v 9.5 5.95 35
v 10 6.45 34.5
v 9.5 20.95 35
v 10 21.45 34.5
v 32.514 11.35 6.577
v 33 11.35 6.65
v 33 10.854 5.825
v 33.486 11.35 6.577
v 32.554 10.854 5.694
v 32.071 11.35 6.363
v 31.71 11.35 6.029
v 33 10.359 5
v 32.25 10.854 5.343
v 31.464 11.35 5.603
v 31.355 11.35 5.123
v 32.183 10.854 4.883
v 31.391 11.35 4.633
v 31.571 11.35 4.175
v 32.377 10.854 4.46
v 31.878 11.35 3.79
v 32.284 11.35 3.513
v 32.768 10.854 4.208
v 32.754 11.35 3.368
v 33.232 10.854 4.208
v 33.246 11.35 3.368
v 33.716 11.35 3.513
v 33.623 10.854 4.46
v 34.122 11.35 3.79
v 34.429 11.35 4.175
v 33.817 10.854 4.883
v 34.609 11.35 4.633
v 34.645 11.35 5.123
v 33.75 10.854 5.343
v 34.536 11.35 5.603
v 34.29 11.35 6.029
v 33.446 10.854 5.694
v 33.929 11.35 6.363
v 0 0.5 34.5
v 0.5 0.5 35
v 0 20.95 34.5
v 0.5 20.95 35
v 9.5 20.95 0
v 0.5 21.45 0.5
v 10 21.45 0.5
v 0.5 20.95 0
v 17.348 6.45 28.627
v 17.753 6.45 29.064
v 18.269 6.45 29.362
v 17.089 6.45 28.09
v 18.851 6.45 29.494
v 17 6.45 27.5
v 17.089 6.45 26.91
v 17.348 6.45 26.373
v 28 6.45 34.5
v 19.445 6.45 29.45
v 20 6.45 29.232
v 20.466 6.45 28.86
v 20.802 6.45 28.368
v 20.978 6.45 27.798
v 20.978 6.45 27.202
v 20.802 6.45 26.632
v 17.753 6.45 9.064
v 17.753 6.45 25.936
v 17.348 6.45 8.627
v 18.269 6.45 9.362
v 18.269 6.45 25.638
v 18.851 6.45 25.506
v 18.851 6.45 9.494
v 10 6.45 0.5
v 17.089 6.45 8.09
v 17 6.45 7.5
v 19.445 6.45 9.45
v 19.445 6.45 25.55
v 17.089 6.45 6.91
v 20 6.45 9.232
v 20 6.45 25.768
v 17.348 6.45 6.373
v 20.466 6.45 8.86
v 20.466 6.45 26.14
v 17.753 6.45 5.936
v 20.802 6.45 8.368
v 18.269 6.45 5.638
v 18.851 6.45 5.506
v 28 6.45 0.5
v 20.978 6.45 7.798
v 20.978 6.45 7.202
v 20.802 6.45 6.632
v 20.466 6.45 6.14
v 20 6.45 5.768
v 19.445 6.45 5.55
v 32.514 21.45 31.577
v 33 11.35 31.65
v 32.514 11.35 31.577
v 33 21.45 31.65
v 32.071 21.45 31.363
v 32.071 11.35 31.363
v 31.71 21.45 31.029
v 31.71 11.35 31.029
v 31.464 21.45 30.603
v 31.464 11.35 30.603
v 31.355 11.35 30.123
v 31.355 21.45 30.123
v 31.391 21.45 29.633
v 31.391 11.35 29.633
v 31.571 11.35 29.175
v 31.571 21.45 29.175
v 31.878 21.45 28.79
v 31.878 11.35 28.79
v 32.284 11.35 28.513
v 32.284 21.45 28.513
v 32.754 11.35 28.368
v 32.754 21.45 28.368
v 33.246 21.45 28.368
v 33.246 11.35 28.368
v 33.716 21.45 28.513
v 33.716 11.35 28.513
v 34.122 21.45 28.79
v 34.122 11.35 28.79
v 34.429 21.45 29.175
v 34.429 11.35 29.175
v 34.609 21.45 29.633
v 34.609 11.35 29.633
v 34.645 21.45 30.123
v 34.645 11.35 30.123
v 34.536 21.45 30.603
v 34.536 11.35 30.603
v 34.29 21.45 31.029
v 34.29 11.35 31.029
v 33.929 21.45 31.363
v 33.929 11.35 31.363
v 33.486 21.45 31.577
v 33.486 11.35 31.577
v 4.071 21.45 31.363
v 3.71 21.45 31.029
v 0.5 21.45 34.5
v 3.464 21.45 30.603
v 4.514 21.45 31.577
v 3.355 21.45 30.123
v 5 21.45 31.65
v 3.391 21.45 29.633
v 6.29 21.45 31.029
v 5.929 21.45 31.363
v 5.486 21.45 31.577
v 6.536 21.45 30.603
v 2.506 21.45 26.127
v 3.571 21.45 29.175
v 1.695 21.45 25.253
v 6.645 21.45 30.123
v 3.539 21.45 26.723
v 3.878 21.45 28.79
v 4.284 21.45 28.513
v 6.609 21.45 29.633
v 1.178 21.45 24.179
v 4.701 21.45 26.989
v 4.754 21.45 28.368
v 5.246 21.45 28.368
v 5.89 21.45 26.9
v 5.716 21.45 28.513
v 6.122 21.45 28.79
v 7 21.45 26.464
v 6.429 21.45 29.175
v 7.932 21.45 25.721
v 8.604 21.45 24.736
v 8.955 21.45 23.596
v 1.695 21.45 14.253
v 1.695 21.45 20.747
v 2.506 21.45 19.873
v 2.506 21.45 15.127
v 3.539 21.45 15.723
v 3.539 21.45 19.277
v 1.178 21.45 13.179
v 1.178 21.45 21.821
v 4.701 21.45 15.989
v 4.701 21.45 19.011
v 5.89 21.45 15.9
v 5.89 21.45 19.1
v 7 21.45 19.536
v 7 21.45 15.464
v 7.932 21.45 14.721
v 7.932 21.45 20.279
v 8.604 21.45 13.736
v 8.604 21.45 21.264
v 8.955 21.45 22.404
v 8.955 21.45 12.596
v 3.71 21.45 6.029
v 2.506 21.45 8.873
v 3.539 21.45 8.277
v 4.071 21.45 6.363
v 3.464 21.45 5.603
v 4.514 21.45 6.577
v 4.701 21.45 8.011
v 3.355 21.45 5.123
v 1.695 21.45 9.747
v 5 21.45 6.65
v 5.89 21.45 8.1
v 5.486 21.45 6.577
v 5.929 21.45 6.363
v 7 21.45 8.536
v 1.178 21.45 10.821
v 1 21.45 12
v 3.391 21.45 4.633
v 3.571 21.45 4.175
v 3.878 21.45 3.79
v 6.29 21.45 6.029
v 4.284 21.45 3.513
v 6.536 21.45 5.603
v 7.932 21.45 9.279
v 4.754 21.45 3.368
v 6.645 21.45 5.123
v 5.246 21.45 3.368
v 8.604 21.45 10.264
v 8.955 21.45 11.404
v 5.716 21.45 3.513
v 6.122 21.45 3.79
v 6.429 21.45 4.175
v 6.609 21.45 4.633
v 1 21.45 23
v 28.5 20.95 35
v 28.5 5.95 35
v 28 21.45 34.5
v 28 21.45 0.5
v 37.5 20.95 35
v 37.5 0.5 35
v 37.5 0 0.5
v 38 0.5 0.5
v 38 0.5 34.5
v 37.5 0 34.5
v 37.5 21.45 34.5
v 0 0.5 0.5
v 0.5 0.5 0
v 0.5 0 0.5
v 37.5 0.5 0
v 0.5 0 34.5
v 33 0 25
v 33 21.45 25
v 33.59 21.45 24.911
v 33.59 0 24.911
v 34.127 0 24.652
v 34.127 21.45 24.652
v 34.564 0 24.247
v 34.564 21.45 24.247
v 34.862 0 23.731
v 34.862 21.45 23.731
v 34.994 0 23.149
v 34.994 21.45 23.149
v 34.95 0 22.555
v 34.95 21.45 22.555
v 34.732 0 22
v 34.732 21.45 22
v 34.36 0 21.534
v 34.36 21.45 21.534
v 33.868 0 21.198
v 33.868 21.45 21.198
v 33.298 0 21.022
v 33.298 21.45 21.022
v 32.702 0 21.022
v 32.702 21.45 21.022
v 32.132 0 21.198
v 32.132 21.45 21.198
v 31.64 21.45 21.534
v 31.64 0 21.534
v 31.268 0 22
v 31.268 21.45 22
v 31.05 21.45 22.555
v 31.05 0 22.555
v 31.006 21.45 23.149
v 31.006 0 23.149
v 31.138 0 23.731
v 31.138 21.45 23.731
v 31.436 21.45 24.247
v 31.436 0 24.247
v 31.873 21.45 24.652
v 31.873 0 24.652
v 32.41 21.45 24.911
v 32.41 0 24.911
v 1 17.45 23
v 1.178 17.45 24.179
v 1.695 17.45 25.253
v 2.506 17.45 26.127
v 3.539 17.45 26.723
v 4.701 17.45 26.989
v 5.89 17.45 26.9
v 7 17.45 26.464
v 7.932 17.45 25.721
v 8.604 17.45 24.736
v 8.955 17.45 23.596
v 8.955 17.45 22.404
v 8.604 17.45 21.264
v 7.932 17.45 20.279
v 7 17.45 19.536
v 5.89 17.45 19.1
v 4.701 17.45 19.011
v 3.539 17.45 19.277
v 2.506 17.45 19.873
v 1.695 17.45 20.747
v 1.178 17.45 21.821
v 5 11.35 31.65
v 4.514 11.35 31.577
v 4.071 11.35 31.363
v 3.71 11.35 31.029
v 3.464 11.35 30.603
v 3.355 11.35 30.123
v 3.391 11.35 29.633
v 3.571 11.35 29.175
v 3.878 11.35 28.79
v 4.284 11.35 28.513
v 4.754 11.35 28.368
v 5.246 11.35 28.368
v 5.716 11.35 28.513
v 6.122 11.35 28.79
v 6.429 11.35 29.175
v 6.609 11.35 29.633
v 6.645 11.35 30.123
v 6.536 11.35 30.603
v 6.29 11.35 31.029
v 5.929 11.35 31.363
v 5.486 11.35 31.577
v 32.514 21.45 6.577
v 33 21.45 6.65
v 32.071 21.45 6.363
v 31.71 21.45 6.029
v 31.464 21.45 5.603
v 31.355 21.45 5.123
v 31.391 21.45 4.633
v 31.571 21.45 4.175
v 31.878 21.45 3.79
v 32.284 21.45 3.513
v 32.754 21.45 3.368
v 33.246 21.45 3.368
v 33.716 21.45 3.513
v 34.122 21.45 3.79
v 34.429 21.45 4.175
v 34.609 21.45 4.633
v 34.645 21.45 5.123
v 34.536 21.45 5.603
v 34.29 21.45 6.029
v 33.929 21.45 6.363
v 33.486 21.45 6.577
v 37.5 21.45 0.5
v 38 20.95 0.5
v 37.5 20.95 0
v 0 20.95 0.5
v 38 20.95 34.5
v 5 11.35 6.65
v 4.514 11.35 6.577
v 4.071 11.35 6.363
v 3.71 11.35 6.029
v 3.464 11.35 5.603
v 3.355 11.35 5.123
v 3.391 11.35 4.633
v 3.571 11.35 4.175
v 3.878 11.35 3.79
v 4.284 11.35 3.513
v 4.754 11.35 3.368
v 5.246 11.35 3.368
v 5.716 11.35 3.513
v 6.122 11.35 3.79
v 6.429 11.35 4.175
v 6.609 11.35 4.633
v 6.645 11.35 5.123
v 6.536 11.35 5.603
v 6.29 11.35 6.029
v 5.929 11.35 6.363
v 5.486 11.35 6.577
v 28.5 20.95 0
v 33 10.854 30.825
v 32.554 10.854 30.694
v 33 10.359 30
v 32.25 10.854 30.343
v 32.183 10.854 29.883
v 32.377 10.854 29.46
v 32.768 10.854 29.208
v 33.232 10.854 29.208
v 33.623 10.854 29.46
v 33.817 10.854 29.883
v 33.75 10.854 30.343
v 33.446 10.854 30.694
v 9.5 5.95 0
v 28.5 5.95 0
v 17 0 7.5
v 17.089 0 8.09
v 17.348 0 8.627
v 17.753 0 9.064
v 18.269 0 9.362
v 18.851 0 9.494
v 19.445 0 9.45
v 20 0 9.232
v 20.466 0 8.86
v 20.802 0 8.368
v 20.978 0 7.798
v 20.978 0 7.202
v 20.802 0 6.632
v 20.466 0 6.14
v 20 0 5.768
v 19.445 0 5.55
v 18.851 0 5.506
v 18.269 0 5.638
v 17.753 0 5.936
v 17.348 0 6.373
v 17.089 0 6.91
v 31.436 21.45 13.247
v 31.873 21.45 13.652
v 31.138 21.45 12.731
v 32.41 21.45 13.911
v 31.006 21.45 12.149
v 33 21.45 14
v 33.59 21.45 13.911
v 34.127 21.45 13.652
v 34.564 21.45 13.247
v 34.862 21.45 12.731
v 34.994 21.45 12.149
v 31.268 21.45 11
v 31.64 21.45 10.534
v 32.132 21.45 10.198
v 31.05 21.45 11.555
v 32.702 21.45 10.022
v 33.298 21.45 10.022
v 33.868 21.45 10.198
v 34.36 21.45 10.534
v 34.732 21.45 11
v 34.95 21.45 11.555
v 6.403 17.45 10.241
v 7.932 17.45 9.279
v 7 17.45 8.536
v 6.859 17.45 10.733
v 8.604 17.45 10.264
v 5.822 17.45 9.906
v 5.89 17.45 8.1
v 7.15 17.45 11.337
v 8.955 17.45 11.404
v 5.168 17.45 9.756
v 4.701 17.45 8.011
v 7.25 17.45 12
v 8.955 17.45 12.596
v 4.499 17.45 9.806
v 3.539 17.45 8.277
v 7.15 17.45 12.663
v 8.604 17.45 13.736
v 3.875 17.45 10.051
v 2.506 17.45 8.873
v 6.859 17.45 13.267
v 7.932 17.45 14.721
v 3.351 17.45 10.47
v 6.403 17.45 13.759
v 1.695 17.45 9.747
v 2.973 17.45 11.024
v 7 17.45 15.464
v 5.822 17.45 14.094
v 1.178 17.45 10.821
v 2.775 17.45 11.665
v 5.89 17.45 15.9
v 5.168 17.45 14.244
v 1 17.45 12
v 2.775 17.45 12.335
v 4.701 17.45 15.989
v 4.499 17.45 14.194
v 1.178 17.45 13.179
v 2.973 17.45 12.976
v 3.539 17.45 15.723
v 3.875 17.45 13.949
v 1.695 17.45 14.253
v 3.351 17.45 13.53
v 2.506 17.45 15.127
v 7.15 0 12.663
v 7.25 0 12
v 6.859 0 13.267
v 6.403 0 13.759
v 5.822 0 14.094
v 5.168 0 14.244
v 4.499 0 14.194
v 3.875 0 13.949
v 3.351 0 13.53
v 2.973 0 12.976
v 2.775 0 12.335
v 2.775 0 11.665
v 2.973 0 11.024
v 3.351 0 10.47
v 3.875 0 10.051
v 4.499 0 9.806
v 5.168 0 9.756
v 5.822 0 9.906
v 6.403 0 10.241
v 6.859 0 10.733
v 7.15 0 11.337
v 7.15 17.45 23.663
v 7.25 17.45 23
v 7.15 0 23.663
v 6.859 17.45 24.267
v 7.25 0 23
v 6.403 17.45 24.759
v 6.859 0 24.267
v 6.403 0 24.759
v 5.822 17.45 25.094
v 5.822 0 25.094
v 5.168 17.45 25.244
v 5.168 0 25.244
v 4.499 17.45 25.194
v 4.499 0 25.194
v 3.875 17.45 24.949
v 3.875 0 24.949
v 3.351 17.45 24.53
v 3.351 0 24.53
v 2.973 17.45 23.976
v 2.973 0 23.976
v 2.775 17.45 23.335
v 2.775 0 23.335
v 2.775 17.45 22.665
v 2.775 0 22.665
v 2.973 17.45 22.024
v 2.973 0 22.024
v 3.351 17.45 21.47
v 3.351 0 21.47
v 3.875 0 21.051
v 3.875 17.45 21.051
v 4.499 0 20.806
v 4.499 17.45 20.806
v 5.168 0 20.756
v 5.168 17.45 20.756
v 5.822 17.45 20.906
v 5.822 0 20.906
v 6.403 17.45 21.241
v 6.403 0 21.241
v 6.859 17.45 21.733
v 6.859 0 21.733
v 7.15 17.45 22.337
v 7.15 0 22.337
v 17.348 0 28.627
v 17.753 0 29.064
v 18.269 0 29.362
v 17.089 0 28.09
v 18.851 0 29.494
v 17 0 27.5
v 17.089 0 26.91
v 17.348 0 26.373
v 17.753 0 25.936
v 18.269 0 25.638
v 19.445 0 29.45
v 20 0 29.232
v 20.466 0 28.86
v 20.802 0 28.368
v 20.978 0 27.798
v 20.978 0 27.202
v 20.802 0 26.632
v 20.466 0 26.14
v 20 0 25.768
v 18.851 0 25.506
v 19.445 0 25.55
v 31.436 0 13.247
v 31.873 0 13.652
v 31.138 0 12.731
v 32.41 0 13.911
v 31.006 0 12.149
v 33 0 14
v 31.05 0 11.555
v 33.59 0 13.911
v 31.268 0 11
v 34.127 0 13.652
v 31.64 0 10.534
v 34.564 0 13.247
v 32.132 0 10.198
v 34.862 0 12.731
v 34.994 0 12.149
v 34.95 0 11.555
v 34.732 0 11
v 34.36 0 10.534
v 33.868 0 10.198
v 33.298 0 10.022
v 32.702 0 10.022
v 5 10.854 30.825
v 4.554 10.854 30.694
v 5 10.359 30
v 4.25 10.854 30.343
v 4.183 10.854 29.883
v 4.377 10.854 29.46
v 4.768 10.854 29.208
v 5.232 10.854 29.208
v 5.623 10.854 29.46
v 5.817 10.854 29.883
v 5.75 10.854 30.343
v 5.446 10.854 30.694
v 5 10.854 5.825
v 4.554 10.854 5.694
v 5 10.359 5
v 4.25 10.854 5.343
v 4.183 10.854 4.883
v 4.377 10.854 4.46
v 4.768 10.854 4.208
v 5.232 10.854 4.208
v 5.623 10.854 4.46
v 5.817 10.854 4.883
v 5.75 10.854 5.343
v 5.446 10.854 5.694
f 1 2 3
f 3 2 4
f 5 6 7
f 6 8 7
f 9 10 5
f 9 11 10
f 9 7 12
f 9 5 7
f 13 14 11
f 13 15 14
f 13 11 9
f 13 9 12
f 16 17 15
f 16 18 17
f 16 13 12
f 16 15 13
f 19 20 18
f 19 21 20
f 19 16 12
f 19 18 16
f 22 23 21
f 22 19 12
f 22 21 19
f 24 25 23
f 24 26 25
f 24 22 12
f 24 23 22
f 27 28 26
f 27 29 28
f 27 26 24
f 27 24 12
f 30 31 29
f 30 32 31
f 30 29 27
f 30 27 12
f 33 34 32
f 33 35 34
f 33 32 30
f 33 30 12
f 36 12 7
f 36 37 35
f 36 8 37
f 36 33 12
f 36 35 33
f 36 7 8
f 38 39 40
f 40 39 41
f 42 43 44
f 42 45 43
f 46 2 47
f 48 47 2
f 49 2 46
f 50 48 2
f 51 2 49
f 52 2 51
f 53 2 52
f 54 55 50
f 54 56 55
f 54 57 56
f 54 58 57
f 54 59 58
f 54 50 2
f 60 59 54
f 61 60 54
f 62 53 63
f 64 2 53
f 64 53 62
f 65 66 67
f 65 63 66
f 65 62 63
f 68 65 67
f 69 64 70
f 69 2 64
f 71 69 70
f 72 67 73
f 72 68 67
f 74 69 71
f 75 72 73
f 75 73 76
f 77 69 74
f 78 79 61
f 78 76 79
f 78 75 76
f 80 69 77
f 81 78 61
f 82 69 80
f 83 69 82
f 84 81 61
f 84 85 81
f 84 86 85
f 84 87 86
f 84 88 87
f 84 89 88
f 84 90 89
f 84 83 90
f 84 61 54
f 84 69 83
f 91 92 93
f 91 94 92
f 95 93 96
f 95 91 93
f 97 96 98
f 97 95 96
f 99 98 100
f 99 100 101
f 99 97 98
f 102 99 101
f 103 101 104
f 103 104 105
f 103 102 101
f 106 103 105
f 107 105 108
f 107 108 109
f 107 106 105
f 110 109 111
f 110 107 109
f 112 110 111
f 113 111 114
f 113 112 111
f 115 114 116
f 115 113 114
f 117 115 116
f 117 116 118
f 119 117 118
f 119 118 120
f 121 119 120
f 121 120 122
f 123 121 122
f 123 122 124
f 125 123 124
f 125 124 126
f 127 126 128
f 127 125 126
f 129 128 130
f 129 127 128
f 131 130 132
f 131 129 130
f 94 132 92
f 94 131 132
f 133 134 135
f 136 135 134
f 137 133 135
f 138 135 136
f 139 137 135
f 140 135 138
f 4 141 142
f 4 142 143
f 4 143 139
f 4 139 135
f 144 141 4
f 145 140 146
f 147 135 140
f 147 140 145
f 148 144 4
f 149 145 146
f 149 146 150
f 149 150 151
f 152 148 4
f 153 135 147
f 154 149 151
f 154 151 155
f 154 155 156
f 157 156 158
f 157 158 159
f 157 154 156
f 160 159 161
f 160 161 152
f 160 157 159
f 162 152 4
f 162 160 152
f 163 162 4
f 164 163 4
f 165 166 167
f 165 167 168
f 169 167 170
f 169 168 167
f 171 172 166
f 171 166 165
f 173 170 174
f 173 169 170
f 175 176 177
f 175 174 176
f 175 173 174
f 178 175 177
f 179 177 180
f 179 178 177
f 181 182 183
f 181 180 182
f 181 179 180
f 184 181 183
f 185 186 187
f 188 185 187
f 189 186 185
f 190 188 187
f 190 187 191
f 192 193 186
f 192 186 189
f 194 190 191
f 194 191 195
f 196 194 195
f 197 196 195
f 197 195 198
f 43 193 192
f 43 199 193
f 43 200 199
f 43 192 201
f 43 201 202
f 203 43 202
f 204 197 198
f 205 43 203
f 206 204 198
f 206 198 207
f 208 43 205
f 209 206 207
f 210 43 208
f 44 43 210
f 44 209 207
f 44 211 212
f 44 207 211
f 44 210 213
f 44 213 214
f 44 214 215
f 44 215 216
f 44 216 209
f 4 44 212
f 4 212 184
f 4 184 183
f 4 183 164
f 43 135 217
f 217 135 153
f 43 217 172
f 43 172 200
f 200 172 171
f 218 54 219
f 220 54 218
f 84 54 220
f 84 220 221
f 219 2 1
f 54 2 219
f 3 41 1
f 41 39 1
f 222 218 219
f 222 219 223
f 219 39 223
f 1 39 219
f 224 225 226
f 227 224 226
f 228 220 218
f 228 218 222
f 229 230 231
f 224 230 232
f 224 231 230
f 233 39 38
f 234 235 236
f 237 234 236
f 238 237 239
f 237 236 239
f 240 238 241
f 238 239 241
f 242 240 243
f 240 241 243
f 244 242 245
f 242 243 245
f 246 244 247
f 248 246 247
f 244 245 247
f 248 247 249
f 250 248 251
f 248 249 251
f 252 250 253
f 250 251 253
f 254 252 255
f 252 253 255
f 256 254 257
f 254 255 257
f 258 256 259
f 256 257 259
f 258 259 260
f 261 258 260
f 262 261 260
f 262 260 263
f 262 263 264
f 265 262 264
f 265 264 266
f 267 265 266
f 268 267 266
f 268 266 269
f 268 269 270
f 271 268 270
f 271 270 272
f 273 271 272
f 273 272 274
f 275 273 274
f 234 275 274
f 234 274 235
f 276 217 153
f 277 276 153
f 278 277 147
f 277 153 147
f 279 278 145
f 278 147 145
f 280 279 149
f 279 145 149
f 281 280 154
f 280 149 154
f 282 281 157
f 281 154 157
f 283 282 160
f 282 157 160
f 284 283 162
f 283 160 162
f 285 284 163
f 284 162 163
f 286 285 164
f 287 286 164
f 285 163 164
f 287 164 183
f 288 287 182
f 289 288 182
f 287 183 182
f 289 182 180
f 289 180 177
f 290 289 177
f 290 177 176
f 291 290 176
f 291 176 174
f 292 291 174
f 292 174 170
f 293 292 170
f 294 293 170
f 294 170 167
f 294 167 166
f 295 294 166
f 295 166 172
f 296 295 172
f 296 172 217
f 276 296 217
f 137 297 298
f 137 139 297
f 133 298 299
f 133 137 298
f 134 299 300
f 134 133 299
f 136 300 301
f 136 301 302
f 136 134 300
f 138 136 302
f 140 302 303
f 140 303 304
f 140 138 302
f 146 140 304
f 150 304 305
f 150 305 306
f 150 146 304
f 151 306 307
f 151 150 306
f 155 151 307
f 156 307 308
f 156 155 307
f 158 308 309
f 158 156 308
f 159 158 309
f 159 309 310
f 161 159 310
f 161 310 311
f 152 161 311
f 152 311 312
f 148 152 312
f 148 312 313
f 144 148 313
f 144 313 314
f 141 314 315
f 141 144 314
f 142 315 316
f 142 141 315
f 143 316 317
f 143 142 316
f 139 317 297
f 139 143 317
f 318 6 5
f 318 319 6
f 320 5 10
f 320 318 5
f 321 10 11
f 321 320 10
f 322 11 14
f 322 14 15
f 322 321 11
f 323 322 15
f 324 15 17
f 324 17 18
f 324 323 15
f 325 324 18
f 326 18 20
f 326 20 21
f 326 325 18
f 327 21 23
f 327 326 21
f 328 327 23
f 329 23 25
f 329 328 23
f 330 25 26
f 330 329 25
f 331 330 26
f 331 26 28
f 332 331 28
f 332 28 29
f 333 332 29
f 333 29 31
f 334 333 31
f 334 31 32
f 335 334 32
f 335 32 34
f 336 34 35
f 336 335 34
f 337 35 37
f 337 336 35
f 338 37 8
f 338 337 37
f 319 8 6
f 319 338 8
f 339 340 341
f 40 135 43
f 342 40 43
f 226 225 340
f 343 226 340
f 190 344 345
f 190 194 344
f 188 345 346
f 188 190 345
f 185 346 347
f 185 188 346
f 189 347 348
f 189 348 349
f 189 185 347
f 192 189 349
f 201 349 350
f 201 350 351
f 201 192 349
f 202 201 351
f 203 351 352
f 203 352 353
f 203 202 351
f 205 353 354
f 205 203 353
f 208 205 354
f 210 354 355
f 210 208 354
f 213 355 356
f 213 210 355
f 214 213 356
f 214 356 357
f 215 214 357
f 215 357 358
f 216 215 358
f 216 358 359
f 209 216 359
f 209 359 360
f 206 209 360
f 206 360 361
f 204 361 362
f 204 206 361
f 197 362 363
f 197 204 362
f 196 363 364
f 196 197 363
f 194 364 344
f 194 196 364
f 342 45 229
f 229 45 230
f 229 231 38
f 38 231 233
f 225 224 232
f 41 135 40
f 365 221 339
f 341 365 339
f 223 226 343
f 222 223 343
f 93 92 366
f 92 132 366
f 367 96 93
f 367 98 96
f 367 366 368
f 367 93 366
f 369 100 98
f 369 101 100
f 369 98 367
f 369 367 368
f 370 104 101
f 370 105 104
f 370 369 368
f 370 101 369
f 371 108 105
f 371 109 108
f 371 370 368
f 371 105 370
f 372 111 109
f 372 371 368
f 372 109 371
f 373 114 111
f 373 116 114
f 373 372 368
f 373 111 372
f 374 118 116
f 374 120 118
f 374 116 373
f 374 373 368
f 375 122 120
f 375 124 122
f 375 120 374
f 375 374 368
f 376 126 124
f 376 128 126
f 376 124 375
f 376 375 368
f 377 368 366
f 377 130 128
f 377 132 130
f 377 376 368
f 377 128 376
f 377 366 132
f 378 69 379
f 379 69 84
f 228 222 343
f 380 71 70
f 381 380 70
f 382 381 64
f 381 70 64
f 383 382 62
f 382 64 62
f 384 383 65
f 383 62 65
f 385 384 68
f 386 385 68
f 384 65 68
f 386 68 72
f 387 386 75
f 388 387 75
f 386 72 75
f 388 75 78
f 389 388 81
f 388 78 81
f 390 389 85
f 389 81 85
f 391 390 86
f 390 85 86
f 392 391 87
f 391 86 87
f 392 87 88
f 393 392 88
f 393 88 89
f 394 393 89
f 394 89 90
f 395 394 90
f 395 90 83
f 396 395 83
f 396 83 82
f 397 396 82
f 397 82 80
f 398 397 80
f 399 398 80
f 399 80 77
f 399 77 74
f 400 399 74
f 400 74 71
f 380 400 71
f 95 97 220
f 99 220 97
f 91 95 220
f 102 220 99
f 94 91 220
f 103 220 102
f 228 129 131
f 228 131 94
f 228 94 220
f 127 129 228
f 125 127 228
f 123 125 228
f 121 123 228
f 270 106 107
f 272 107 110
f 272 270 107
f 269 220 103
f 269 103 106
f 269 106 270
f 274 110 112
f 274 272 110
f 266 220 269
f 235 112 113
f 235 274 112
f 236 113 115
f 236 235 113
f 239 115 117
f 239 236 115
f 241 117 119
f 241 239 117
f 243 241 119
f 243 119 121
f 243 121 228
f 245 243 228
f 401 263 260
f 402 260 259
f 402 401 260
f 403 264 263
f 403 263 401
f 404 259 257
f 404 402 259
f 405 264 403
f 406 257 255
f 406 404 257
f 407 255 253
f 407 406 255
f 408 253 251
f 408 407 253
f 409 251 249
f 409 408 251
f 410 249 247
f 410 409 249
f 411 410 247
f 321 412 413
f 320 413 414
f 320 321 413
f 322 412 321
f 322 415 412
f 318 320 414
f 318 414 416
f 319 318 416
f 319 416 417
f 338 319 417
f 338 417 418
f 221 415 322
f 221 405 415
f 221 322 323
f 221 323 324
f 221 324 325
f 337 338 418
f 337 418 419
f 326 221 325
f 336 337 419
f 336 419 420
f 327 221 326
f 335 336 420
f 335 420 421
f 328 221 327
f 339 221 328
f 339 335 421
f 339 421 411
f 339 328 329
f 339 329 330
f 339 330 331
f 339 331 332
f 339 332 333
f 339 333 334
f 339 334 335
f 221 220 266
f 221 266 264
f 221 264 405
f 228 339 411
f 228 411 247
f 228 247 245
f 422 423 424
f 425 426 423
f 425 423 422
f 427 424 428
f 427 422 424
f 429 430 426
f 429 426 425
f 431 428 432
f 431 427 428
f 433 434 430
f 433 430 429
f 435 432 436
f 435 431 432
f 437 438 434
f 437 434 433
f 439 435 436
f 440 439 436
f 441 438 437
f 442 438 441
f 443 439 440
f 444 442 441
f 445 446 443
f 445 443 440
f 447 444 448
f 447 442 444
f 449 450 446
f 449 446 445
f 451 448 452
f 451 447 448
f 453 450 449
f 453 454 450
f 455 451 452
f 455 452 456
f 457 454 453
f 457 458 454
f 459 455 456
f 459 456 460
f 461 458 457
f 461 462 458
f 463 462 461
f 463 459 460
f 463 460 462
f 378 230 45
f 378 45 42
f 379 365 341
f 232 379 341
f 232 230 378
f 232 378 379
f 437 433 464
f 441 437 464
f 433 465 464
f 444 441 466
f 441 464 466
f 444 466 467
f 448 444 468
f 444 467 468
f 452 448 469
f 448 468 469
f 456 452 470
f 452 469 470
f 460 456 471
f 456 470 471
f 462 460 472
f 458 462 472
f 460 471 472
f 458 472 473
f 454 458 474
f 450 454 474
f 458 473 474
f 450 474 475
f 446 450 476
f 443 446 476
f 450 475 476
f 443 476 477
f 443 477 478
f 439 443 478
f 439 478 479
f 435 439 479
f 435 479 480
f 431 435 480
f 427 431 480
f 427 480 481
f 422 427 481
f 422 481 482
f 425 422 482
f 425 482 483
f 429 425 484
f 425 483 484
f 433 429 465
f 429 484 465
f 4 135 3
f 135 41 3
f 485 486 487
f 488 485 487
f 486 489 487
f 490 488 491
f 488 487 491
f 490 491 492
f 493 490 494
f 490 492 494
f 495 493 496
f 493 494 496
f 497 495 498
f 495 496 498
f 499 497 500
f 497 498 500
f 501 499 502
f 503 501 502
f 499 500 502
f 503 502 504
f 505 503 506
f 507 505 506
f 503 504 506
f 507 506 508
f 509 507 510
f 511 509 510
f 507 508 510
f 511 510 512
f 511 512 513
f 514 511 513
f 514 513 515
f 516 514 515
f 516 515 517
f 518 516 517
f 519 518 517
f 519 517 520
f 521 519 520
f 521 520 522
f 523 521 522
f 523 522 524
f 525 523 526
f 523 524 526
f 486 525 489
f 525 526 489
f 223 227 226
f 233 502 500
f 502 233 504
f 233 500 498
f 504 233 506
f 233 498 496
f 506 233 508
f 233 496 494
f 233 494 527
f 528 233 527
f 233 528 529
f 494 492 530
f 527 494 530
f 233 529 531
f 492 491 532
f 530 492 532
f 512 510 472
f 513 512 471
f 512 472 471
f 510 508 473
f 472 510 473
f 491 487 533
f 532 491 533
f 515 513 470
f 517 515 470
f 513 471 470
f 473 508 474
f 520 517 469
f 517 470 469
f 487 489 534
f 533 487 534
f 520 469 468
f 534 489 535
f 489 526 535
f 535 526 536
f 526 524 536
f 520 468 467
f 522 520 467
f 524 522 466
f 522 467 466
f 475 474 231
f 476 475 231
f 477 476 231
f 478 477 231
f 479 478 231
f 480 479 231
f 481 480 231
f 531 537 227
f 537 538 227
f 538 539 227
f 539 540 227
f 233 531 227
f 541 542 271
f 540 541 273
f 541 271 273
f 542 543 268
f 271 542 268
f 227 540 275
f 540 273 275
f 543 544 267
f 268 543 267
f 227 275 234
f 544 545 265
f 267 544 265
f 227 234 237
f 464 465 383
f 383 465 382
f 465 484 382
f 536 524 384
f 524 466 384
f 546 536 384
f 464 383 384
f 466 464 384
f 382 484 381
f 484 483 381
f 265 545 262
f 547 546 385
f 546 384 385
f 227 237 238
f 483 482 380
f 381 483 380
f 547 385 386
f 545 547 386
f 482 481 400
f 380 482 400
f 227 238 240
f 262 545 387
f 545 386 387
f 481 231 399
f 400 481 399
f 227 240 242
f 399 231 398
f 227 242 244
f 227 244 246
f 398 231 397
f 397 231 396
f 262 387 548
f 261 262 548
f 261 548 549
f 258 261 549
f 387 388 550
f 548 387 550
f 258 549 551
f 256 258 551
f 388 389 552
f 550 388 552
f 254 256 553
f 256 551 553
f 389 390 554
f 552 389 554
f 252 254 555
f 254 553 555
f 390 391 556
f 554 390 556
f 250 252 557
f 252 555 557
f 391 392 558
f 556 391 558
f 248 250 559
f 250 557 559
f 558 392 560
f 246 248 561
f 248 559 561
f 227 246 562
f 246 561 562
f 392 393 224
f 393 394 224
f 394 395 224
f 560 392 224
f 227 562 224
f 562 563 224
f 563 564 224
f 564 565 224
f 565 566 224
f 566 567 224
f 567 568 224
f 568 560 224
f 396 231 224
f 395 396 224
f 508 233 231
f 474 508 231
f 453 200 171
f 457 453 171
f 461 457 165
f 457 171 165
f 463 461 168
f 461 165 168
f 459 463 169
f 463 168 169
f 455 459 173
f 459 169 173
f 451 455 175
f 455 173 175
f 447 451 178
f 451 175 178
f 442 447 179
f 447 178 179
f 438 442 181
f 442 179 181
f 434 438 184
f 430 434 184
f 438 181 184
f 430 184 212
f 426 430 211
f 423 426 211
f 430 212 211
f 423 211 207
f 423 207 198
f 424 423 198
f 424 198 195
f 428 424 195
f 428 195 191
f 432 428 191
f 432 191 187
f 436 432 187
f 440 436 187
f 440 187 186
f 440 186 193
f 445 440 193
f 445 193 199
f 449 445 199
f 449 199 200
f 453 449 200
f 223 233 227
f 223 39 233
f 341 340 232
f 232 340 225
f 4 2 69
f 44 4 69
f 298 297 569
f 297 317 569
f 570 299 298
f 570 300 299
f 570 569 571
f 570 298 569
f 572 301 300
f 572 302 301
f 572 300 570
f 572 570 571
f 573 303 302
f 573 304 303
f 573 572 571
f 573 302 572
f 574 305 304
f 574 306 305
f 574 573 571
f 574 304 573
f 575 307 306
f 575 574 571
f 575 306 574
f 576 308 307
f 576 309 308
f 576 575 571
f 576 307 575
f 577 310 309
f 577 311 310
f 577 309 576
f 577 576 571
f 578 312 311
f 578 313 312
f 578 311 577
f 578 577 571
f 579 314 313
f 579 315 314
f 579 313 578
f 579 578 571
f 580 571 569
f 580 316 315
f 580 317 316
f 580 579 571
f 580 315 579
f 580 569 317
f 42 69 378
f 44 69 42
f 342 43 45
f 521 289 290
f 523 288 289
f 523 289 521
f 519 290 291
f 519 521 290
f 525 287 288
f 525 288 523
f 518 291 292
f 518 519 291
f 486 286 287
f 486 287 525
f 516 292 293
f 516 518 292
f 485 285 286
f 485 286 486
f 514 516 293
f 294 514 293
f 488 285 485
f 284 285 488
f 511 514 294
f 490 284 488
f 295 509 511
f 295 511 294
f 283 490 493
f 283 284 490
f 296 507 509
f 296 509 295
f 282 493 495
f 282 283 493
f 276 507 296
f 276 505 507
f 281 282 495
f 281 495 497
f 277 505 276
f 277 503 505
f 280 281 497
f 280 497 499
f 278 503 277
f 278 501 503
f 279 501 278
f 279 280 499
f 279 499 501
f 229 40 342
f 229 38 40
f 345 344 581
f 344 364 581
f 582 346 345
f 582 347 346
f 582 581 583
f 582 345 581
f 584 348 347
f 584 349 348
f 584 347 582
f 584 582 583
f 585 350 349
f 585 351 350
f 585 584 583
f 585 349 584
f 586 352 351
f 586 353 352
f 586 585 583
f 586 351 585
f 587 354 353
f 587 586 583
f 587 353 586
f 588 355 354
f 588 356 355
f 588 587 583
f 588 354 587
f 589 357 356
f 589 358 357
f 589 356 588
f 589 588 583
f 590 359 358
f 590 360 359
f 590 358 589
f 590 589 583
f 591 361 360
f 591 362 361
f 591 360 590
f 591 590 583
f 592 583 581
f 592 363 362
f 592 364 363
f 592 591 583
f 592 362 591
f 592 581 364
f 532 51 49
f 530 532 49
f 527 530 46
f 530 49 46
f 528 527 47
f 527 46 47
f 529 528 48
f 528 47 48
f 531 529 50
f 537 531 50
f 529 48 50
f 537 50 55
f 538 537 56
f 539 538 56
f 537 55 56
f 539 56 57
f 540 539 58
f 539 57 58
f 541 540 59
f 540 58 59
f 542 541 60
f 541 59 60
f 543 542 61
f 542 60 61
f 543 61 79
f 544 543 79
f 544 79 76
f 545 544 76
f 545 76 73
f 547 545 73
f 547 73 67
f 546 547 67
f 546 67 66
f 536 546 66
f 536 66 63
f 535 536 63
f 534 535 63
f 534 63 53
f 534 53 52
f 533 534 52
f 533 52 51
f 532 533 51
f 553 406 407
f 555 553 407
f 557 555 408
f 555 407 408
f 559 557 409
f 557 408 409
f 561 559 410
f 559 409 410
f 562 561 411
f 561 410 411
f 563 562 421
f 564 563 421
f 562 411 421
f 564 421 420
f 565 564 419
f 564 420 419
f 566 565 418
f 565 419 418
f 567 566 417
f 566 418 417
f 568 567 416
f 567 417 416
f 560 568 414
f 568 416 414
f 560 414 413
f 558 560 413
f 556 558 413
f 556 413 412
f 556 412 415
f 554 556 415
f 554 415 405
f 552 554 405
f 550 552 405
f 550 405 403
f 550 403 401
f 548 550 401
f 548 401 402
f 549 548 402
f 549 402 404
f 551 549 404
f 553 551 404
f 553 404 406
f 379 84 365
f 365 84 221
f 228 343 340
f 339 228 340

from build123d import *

# Parameters (mm, degrees)
SKETCH_1_W                   = 38
SKETCH_1_H                   = 6.45
EXTRUDE_1_DEPTH              = 35
SKETCH_2_W                   = 10
SKETCH_2_H                   = 35
EXTRUDE_2_DEPTH              = 15
HOLE_WIZARD_M4_1_D           = 4.5
HOLE_WIZARD_M4_1_CBORE_D     = 8
HOLE_WIZARD_M4_1_CBORE_DEPTH = 4
PATTERN_LINEAR_1_COUNT       = 2
PATTERN_LINEAR_1_PITCH       = 11
SKETCH_5_R                   = 2
CUT_EXTRUDE_1_DEPTH          = 54.795910625
SKETCH_6_R                   = 2
CUT_EXTRUDE_2_DEPTH          = 56.938381278
PATTERN_LINEAR_2_COUNT       = 2
PATTERN_LINEAR_2_PITCH       = 28
PATTERN_LINEAR_2_COUNT_DIR2  = 2
PATTERN_LINEAR_2_PITCH_DIR2  = 25
CHAMFER_1_SIZE               = 0.5


with BuildPart() as part:
    # 草图1 → 凸台-拉伸1 (new body)
    with BuildSketch(Plane.XY):
        with Locations((19, 3.225)):
            Rectangle(SKETCH_1_W, SKETCH_1_H)
    extrude(amount=EXTRUDE_1_DEPTH)

    # 草图2 → 凸台-拉伸2 (add)
    with BuildSketch(Plane(origin=(0, 6.45, 0), x_dir=(1, 0, 0), z_dir=(0, 1, 0))):
        with Locations((5, -17.5)):
            Rectangle(SKETCH_2_W, SKETCH_2_H)
        with Locations((33, -17.5)):
            Rectangle(SKETCH_2_W, SKETCH_2_H)
    extrude(amount=EXTRUDE_2_DEPTH)

    # Hole Wizard M4 _1 (through all)
    with Locations(Plane(origin=(0, 21.45, 0), x_dir=(-1, 0, 0), z_dir=(0, 1, 0))):
        with Locations((-5, 23)):
            hole_wizard_m4_1 = CounterBoreHole(HOLE_WIZARD_M4_1_D / 2, HOLE_WIZARD_M4_1_CBORE_D / 2, HOLE_WIZARD_M4_1_CBORE_DEPTH)

    # 阵列(线性)1: Hole Wizard M4 _1 ×2
    with Locations(*[(0, 0, -i * PATTERN_LINEAR_1_PITCH) for i in range(1, PATTERN_LINEAR_1_COUNT)]):
        add(hole_wizard_m4_1, mode=Mode.SUBTRACT)

    # 草图5 → 切除-拉伸1 (cut, through all)
    with BuildSketch(Plane(origin=(0, 6.45, 0), x_dir=(1, 0, 0), z_dir=(0, 1, 0))):
        with Locations(Location((19, -27.5, 0), (0, 0, 180))):
            Circle(SKETCH_5_R)
        with Locations(Location((19, -7.5, 0), (0, 0, 180))):
            Circle(SKETCH_5_R)
    extrude(amount=-CUT_EXTRUDE_1_DEPTH, mode=Mode.SUBTRACT)

    # 草图6 → 切除-拉伸2 (cut, through all)
    with BuildSketch(Plane(origin=(0, 21.45, 0), x_dir=(1, 0, 0), z_dir=(0, 1, 0))):
        with Locations(Location((33, -23, 0), (0, 0, 270))):
            Circle(SKETCH_6_R)
        with Locations(Location((33, -12, 0), (0, 0, 270))):
            Circle(SKETCH_6_R)
    extrude(amount=-CUT_EXTRUDE_2_DEPTH, mode=Mode.SUBTRACT)

    # 草图7 → Hole Wizard M4 _1 2 (revolve, cut)
    with BuildSketch(Plane(origin=(5, 21.45, 30), x_dir=(0, 0, 1), z_dir=(1, 0, 0))):
        Polygon((0, 0), (0, 11.091420021), (1.65, 10.1), (1.65, 0), align=None)
    hole_wizard_m4_1_2 = revolve(axis=Axis((5, 27.8, 30), (0, -1, 0)), mode=Mode.SUBTRACT)

    # 阵列(线性)2: Hole Wizard M4 _1 2 2 × 2
    with Locations(*[(i * PATTERN_LINEAR_2_PITCH, 0, -j * PATTERN_LINEAR_2_PITCH_DIR2) for i in range(PATTERN_LINEAR_2_COUNT) for j in range(PATTERN_LINEAR_2_COUNT_DIR2) if (i, j) != (0, 0)]):
        add(hole_wizard_m4_1_2, mode=Mode.SUBTRACT)

    # 倒角1
    chamfer_1_edges = [part.edges().sort_by_distance(p)[0] for p in [
        (5, 21.45, 35),
        (10, 13.95, 35),
        (19, 6.45, 0),
        (19, 6.45, 35),
        (28, 13.95, 35),
        (33, 21.45, 35),
        (19, 0, 0),
        (19, 0, 35),
        (38, 0, 17.5),
        (38, 10.725, 0),
        (38, 10.725, 35),
        (38, 21.45, 17.5),
        (33, 21.45, 0),
        (28, 13.95, 0),
        (10, 13.95, 0),
        (5, 21.45, 0),
        (0, 21.45, 17.5),
        (0, 10.725, 0),
        (0, 10.725, 35),
        (0, 0, 17.5),
    ]]
    chamfer(chamfer_1_edges, length=CHAMFER_1_SIZE)


solid = part.part
